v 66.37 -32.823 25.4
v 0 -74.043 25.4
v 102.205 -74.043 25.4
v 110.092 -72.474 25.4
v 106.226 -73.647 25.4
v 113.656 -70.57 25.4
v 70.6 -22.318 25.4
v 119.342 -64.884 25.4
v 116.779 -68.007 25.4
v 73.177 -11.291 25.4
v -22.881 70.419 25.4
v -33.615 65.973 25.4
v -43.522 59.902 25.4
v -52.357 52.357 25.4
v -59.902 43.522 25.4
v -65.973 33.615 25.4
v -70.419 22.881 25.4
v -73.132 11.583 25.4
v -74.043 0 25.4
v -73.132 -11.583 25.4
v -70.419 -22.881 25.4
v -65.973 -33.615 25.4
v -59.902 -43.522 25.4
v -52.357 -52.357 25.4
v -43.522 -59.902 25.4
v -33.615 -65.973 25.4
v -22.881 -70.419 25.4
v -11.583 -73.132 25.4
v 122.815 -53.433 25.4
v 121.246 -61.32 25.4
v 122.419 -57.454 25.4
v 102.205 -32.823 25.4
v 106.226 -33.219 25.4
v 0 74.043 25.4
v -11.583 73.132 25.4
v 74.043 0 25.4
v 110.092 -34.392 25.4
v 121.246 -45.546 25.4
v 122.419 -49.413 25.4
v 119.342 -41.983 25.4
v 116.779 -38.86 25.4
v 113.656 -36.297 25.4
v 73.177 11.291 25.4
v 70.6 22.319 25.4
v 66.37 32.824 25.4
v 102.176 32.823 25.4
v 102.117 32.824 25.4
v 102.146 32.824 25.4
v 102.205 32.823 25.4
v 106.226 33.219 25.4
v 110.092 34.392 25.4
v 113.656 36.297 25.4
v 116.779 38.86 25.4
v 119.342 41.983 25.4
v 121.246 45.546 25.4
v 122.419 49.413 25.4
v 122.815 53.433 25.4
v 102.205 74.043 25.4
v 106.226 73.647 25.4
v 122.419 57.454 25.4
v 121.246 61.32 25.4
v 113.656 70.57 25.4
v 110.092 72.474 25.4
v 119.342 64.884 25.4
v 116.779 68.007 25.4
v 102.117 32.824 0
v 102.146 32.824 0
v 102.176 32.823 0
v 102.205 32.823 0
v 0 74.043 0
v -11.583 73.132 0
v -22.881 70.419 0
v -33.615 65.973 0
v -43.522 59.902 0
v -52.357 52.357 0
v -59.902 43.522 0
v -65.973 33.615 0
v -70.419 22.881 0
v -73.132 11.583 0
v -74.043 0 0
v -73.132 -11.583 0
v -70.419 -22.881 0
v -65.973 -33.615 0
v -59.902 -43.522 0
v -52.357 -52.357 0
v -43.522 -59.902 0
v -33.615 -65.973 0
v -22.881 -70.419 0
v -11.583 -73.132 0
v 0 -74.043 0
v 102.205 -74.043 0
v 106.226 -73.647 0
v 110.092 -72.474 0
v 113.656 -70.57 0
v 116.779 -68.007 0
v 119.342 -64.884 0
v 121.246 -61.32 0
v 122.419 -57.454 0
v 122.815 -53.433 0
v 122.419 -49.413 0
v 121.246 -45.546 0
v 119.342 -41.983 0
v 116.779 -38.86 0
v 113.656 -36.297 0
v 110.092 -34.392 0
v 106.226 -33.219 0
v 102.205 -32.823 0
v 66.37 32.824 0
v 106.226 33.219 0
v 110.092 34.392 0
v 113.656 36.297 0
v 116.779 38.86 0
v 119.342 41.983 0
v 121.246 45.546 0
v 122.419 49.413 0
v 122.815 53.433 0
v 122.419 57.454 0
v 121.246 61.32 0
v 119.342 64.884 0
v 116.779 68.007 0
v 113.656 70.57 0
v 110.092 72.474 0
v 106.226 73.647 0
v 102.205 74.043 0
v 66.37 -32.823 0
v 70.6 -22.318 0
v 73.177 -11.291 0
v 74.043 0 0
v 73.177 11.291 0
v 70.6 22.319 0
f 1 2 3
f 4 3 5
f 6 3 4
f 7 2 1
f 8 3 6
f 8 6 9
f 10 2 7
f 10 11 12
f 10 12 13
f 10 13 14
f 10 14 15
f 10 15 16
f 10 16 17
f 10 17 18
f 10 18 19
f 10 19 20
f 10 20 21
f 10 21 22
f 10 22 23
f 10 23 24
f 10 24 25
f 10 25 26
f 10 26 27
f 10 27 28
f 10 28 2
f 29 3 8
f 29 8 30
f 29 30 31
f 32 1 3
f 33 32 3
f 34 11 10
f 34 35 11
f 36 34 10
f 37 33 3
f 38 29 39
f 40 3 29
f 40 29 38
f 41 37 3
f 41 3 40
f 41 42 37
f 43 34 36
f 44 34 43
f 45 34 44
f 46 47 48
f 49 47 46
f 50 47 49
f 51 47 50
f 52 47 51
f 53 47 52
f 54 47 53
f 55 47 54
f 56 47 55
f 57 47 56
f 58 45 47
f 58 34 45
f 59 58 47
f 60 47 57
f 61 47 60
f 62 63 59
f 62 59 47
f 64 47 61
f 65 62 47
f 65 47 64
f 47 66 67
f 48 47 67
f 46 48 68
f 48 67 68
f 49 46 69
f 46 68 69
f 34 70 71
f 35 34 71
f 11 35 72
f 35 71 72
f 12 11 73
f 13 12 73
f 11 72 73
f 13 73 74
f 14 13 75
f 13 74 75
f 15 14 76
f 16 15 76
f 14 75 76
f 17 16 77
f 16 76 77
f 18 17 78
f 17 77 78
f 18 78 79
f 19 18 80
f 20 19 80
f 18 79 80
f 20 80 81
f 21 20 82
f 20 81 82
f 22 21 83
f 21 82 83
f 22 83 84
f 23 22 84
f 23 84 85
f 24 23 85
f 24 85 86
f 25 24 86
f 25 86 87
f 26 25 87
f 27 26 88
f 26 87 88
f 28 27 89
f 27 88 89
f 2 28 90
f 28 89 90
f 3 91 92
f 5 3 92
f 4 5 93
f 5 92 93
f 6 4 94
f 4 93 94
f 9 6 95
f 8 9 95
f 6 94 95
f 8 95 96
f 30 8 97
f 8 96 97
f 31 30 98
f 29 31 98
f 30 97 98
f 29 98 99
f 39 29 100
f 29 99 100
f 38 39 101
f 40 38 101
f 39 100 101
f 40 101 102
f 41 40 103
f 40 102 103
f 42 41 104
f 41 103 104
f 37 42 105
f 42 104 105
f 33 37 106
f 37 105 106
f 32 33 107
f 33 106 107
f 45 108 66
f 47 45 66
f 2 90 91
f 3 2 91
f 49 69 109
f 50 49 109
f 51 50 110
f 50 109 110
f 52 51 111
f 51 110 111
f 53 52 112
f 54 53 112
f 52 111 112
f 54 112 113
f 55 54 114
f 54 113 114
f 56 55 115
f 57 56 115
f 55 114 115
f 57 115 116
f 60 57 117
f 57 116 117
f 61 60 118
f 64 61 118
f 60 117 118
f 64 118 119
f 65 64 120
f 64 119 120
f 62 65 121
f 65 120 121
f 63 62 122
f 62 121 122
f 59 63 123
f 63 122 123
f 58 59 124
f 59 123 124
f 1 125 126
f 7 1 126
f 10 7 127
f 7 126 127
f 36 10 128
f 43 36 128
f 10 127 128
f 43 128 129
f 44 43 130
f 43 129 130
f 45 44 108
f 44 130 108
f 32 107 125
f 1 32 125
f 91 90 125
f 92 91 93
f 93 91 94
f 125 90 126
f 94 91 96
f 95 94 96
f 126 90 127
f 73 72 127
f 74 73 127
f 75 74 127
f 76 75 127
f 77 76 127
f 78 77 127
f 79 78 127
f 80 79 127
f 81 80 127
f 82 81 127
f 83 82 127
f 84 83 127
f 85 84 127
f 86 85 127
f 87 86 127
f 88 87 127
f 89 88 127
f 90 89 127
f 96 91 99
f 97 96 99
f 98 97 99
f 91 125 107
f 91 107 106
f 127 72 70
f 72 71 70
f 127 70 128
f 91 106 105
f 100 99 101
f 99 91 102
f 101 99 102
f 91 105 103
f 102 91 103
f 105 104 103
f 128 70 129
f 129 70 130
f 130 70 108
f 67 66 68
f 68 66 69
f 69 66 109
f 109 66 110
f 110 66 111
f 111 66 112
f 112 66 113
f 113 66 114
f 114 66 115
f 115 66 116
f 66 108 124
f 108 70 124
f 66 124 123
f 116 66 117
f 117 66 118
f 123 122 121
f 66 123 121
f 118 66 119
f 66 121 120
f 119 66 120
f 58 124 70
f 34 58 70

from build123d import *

# Parameters (mm, degrees)
F1_DEPTH = 25.4


with BuildPart() as f1:
    # F0 (on Top) → F1 (new body)
    with BuildSketch(Plane.XY):
        with BuildLine():
            ThreePointArc((0.0883997278, 32.8236170641), (-13.058763384, 37.4885196208), (-20.2230135431, 49.4585962042))
            ThreePointArc((-20.2230135431, 49.4585962042), (-53.4333511512, 0), (-20.2230135431, -49.4585962042))
            ThreePointArc((-20.2230135431, -49.4585962042), (-13.0929285798, -37.5165620637), (0, -32.8234274819))
            Line((0, -32.8234274819), (42.1633208321, -32.8234274819))
            ThreePointArc((42.1633208321, -32.8234274819), (50.5373651023, -17.3521682727), (53.4333511512, 0))
            ThreePointArc((53.4333511512, 0), (50.5373260912, 17.3522818904), (42.1631732449, 32.8236170641))
            Line((42.1631732449, 32.8236170641), (0.0883997278, 32.8236170641))
        make_face()
        with BuildLine():
            ThreePointArc((0, -32.8234274819), (-13.0929285798, -37.5165620637), (-20.2230135431, -49.4585962042))
            ThreePointArc((-20.2230135431, -49.4585962042), (-10.3049618346, -52.4302467745), (0, -53.4333511512))
            ThreePointArc((0, -53.4333511512), (10.3049618346, -52.4302467745), (20.2230135431, -49.4585962042))
            ThreePointArc((20.2230135431, -49.4585962042), (13.0929285798, -37.5165620637), (0, -32.8234274819))
        make_face()
        with BuildLine():
            ThreePointArc((0, -32.8234274819), (13.0929285798, -37.5165620637), (20.2230135431, -49.4585962042))
            ThreePointArc((20.2230135431, -49.4585962042), (32.2830588513, -42.5784819651), (42.1633208321, -32.8234274819))
            Line((42.1633208321, -32.8234274819), (0, -32.8234274819))
        make_face()
        with BuildLine():
            Line((0, -53.4333511512), (20.6099236693, -53.4333511512))
            ThreePointArc((20.6099236693, -53.4333511512), (20.5129680829, -51.436580237), (20.2230135431, -49.4585962042))
            ThreePointArc((20.2230135431, -49.4585962042), (10.3049618346, -52.4302467745), (0, -53.4333511512))
        make_face()
        with BuildLine():
            Line((20.6099236693, -53.4333511512), (51.2570339651, -53.4333511512))
            ThreePointArc((51.2570339651, -53.4333511512), (59.7096740135, -43.7854013954), (66.3703936593, -32.8234274819))
            Line((66.3703936593, -32.8234274819), (42.1633208321, -32.8234274819))
            ThreePointArc((42.1633208321, -32.8234274819), (32.2830588513, -42.5784819651), (20.2230135431, -49.4585962042))
            ThreePointArc((20.2230135431, -49.4585962042), (20.5129680829, -51.436580237), (20.6099236693, -53.4333511512))
        make_face()
        with BuildLine():
            ThreePointArc((102.2053944331, -32.8234274819), (87.6319776468, -38.8599343649), (81.5954707638, -53.4333511512))
            Line((81.5954707638, -53.4333511512), (102.2053944331, -53.4333511512))
            Line((102.2053944331, -53.4333511512), (102.2053944331, -32.8234274819))
        make_face()
        with BuildLine():
            ThreePointArc((20.6099236693, 53.4333511512), (14.5734167863, 68.0067679375), (0, 74.0432748205))
            ThreePointArc((0, 74.0432748205), (-15.9167890876, 66.526279731), (-20.2230135431, 49.4585962042))
            ThreePointArc((-20.2230135431, 49.4585962042), (-10.3049618346, 52.4302467745), (0, 53.4333511512))
            Line((0, 53.4333511512), (20.6099236693, 53.4333511512))
        make_face()
        with BuildLine():
            ThreePointArc((51.2570339651, 53.4333511512), (27.6226921414, 68.6978414873), (0, 74.0432748205))
            ThreePointArc((0, 74.0432748205), (14.5734167863, 68.0067679375), (20.6099236693, 53.4333511512))
            Line((20.6099236693, 53.4333511512), (51.2570339651, 53.4333511512))
        make_face()
        with BuildLine():
            ThreePointArc((81.5954707638, -53.4333511512), (87.6319776468, -68.0067679375), (102.2053944331, -74.0432748205))
            Line((102.2053944331, -74.0432748205), (102.2053944331, -53.4333511512))
            Line((102.2053944331, -53.4333511512), (81.5954707638, -53.4333511512))
        make_face()
        with BuildLine():
            Line((102.2053944331, 74.0432748205), (0, 74.0432748205))
            ThreePointArc((0, 74.0432748205), (27.6226921414, 68.6978414873), (51.2570339651, 53.4333511512))
            Line((51.2570339651, 53.4333511512), (81.5954707638, 53.4333511512))
            ThreePointArc((81.5954707638, 53.4333511512), (87.6319776468, 68.0067679375), (102.2053944331, 74.0432748205))
        make_face()
        with BuildLine():
            ThreePointArc((-20.2230135431, -49.4585962042), (-15.9167890876, -66.526279731), (0, -74.0432748205))
            ThreePointArc((0, -74.0432748205), (14.5734167863, -68.0067679375), (20.6099236693, -53.4333511512))
            Line((20.6099236693, -53.4333511512), (0, -53.4333511512))
            ThreePointArc((0, -53.4333511512), (-10.3049618346, -52.4302467745), (-20.2230135431, -49.4585962042))
        make_face()
        with BuildLine():
            ThreePointArc((122.8153181024, 53.4333511512), (116.7788112194, 68.0067679375), (102.2053944331, 74.0432748205))
            Line((102.2053944331, 74.0432748205), (102.2053944331, 53.4333511512))
            Line((102.2053944331, 53.4333511512), (102.2053944331, 32.8236170641))
            Line((102.2053944331, 32.8236170641), (102.2053944331, 32.8234274819))
            ThreePointArc((102.2053944331, 32.8234274819), (116.7788112194, 38.8599343649), (122.8153181024, 53.4333511512))
        make_face()
        with BuildLine():
            Line((102.2053944331, 53.4333511512), (102.2053944331, 74.0432748205))
            ThreePointArc((102.2053944331, 74.0432748205), (87.6319776468, 68.0067679375), (81.5954707638, 53.4333511512))
            Line((81.5954707638, 53.4333511512), (102.2053944331, 53.4333511512))
        make_face()
        with BuildLine():
            ThreePointArc((20.6099236693, -53.4333511512), (14.5734167863, -68.0067679375), (0, -74.0432748205))
            ThreePointArc((0, -74.0432748205), (27.6226921414, -68.6978414873), (51.2570339651, -53.4333511512))
            Line((51.2570339651, -53.4333511512), (20.6099236693, -53.4333511512))
        make_face()
        with BuildLine():
            ThreePointArc((51.2570339651, -53.4333511512), (27.6226921414, -68.6978414873), (0, -74.0432748205))
            Line((0, -74.0432748205), (102.2053944331, -74.0432748205))
            ThreePointArc((102.2053944331, -74.0432748205), (87.6319776468, -68.0067679375), (81.5954707638, -53.4333511512))
            Line((81.5954707638, -53.4333511512), (51.2570339651, -53.4333511512))
        make_face()
        with BuildLine():
            ThreePointArc((-20.2230135431, 49.4585962042), (-15.9167890876, 66.526279731), (0, 74.0432748205))
            ThreePointArc((0, 74.0432748205), (-74.0432748205, 0), (0, -74.0432748205))
            ThreePointArc((0, -74.0432748205), (-15.9167890876, -66.526279731), (-20.2230135431, -49.4585962042))
            ThreePointArc((-20.2230135431, -49.4585962042), (-53.4333511512, 0), (-20.2230135431, 49.4585962042))
        make_face()
        with BuildLine():
            ThreePointArc((66.3703936593, -32.8234274819), (59.7096740135, -43.7854013954), (51.2570339651, -53.4333511512))
            Line((51.2570339651, -53.4333511512), (81.5954707638, -53.4333511512))
            ThreePointArc((81.5954707638, -53.4333511512), (87.6319776468, -38.8599343649), (102.2053944331, -32.8234274819))
            Line((102.2053944331, -32.8234274819), (66.3703936593, -32.8234274819))
        make_face()
        with BuildLine():
            Line((102.2053944331, 32.8236170641), (102.1169947054, 32.8236170641))
            ThreePointArc((102.1169947054, 32.8236170641), (102.1611944676, 32.8234748775), (102.2053944331, 32.8234274819))
            Line((102.2053944331, 32.8234274819), (102.2053944331, 32.8236170641))
        make_face()
        with BuildLine():
            Line((102.2053944331, -53.4333511512), (102.2053944331, -74.0432748205))
            ThreePointArc((102.2053944331, -74.0432748205), (116.7788112194, -68.0067679375), (122.8153181024, -53.4333511512))
            ThreePointArc((122.8153181024, -53.4333511512), (116.7788112194, -38.8599343649), (102.2053944331, -32.8234274819))
            Line((102.2053944331, -32.8234274819), (102.2053944331, -53.4333511512))
        make_face()
        with BuildLine():
            Line((102.2053944331, 53.4333511512), (81.5954707638, 53.4333511512))
            ThreePointArc((81.5954707638, 53.4333511512), (87.6007570653, 38.891221974), (102.1169947054, 32.8236170641))
            Line((102.1169947054, 32.8236170641), (102.2053944331, 32.8236170641))
            Line((102.2053944331, 32.8236170641), (102.2053944331, 53.4333511512))
        make_face()
        with BuildLine():
            Line((81.5954707638, 53.4333511512), (51.2570339651, 53.4333511512))
            ThreePointArc((51.2570339651, 53.4333511512), (59.7096114785, 43.7854866736), (66.3702999012, 32.8236170641))
            Line((66.3702999012, 32.8236170641), (102.1169947054, 32.8236170641))
            ThreePointArc((102.1169947054, 32.8236170641), (87.6007570653, 38.891221974), (81.5954707638, 53.4333511512))
        make_face()
        with BuildLine():
            ThreePointArc((66.3702999012, 32.8236170641), (59.7096114785, 43.7854866736), (51.2570339651, 53.4333511512))
            Line((51.2570339651, 53.4333511512), (20.6099236693, 53.4333511512))
            ThreePointArc((20.6099236693, 53.4333511512), (20.5129680829, 51.436580237), (20.2230135431, 49.4585962042))
            ThreePointArc((20.2230135431, 49.4585962042), (32.2829631266, 42.5785545435), (42.1631732449, 32.8236170641))
            Line((42.1631732449, 32.8236170641), (66.3702999012, 32.8236170641))
        make_face()
        with BuildLine():
            ThreePointArc((20.2230135431, 49.4585962042), (20.5129680829, 51.436580237), (20.6099236693, 53.4333511512))
            Line((20.6099236693, 53.4333511512), (0, 53.4333511512))
            ThreePointArc((0, 53.4333511512), (10.3049618346, 52.4302467745), (20.2230135431, 49.4585962042))
        make_face()
        with BuildLine():
            ThreePointArc((0, 53.4333511512), (-10.3049618346, 52.4302467745), (-20.2230135431, 49.4585962042))
            ThreePointArc((-20.2230135431, 49.4585962042), (-13.058763384, 37.4885196208), (0.0883997278, 32.8236170641))
            ThreePointArc((0.0883997278, 32.8236170641), (13.1270335572, 37.5446777126), (20.2230135431, 49.4585962042))
            ThreePointArc((20.2230135431, 49.4585962042), (10.3049618346, 52.4302467745), (0, 53.4333511512))
        make_face()
        with BuildLine():
            ThreePointArc((74.0432748205, 0), (72.0995176879, 16.8542604501), (66.3702999012, 32.8236170641))
            Line((66.3702999012, 32.8236170641), (42.1631732449, 32.8236170641))
            ThreePointArc((42.1631732449, 32.8236170641), (50.5373260912, 17.3522818904), (53.4333511512, 0))
            Line((53.4333511512, 0), (74.0432748205, 0))
        make_face()
        with BuildLine():
            Line((42.1633208321, -32.8234274819), (66.3703936593, -32.8234274819))
            ThreePointArc((66.3703936593, -32.8234274819), (72.0995417593, -16.8541574765), (74.0432748205, 0))
            Line((74.0432748205, 0), (53.4333511512, 0))
            ThreePointArc((53.4333511512, 0), (50.5373651023, -17.3521682727), (42.1633208321, -32.8234274819))
        make_face()
        with BuildLine():
            ThreePointArc((42.1631732449, 32.8236170641), (32.2829631266, 42.5785545435), (20.2230135431, 49.4585962042))
            ThreePointArc((20.2230135431, 49.4585962042), (13.1270335572, 37.5446777126), (0.0883997278, 32.8236170641))
            Line((0.0883997278, 32.8236170641), (42.1631732449, 32.8236170641))
        make_face()
    extrude(amount=F1_DEPTH)


solid = f1.part
